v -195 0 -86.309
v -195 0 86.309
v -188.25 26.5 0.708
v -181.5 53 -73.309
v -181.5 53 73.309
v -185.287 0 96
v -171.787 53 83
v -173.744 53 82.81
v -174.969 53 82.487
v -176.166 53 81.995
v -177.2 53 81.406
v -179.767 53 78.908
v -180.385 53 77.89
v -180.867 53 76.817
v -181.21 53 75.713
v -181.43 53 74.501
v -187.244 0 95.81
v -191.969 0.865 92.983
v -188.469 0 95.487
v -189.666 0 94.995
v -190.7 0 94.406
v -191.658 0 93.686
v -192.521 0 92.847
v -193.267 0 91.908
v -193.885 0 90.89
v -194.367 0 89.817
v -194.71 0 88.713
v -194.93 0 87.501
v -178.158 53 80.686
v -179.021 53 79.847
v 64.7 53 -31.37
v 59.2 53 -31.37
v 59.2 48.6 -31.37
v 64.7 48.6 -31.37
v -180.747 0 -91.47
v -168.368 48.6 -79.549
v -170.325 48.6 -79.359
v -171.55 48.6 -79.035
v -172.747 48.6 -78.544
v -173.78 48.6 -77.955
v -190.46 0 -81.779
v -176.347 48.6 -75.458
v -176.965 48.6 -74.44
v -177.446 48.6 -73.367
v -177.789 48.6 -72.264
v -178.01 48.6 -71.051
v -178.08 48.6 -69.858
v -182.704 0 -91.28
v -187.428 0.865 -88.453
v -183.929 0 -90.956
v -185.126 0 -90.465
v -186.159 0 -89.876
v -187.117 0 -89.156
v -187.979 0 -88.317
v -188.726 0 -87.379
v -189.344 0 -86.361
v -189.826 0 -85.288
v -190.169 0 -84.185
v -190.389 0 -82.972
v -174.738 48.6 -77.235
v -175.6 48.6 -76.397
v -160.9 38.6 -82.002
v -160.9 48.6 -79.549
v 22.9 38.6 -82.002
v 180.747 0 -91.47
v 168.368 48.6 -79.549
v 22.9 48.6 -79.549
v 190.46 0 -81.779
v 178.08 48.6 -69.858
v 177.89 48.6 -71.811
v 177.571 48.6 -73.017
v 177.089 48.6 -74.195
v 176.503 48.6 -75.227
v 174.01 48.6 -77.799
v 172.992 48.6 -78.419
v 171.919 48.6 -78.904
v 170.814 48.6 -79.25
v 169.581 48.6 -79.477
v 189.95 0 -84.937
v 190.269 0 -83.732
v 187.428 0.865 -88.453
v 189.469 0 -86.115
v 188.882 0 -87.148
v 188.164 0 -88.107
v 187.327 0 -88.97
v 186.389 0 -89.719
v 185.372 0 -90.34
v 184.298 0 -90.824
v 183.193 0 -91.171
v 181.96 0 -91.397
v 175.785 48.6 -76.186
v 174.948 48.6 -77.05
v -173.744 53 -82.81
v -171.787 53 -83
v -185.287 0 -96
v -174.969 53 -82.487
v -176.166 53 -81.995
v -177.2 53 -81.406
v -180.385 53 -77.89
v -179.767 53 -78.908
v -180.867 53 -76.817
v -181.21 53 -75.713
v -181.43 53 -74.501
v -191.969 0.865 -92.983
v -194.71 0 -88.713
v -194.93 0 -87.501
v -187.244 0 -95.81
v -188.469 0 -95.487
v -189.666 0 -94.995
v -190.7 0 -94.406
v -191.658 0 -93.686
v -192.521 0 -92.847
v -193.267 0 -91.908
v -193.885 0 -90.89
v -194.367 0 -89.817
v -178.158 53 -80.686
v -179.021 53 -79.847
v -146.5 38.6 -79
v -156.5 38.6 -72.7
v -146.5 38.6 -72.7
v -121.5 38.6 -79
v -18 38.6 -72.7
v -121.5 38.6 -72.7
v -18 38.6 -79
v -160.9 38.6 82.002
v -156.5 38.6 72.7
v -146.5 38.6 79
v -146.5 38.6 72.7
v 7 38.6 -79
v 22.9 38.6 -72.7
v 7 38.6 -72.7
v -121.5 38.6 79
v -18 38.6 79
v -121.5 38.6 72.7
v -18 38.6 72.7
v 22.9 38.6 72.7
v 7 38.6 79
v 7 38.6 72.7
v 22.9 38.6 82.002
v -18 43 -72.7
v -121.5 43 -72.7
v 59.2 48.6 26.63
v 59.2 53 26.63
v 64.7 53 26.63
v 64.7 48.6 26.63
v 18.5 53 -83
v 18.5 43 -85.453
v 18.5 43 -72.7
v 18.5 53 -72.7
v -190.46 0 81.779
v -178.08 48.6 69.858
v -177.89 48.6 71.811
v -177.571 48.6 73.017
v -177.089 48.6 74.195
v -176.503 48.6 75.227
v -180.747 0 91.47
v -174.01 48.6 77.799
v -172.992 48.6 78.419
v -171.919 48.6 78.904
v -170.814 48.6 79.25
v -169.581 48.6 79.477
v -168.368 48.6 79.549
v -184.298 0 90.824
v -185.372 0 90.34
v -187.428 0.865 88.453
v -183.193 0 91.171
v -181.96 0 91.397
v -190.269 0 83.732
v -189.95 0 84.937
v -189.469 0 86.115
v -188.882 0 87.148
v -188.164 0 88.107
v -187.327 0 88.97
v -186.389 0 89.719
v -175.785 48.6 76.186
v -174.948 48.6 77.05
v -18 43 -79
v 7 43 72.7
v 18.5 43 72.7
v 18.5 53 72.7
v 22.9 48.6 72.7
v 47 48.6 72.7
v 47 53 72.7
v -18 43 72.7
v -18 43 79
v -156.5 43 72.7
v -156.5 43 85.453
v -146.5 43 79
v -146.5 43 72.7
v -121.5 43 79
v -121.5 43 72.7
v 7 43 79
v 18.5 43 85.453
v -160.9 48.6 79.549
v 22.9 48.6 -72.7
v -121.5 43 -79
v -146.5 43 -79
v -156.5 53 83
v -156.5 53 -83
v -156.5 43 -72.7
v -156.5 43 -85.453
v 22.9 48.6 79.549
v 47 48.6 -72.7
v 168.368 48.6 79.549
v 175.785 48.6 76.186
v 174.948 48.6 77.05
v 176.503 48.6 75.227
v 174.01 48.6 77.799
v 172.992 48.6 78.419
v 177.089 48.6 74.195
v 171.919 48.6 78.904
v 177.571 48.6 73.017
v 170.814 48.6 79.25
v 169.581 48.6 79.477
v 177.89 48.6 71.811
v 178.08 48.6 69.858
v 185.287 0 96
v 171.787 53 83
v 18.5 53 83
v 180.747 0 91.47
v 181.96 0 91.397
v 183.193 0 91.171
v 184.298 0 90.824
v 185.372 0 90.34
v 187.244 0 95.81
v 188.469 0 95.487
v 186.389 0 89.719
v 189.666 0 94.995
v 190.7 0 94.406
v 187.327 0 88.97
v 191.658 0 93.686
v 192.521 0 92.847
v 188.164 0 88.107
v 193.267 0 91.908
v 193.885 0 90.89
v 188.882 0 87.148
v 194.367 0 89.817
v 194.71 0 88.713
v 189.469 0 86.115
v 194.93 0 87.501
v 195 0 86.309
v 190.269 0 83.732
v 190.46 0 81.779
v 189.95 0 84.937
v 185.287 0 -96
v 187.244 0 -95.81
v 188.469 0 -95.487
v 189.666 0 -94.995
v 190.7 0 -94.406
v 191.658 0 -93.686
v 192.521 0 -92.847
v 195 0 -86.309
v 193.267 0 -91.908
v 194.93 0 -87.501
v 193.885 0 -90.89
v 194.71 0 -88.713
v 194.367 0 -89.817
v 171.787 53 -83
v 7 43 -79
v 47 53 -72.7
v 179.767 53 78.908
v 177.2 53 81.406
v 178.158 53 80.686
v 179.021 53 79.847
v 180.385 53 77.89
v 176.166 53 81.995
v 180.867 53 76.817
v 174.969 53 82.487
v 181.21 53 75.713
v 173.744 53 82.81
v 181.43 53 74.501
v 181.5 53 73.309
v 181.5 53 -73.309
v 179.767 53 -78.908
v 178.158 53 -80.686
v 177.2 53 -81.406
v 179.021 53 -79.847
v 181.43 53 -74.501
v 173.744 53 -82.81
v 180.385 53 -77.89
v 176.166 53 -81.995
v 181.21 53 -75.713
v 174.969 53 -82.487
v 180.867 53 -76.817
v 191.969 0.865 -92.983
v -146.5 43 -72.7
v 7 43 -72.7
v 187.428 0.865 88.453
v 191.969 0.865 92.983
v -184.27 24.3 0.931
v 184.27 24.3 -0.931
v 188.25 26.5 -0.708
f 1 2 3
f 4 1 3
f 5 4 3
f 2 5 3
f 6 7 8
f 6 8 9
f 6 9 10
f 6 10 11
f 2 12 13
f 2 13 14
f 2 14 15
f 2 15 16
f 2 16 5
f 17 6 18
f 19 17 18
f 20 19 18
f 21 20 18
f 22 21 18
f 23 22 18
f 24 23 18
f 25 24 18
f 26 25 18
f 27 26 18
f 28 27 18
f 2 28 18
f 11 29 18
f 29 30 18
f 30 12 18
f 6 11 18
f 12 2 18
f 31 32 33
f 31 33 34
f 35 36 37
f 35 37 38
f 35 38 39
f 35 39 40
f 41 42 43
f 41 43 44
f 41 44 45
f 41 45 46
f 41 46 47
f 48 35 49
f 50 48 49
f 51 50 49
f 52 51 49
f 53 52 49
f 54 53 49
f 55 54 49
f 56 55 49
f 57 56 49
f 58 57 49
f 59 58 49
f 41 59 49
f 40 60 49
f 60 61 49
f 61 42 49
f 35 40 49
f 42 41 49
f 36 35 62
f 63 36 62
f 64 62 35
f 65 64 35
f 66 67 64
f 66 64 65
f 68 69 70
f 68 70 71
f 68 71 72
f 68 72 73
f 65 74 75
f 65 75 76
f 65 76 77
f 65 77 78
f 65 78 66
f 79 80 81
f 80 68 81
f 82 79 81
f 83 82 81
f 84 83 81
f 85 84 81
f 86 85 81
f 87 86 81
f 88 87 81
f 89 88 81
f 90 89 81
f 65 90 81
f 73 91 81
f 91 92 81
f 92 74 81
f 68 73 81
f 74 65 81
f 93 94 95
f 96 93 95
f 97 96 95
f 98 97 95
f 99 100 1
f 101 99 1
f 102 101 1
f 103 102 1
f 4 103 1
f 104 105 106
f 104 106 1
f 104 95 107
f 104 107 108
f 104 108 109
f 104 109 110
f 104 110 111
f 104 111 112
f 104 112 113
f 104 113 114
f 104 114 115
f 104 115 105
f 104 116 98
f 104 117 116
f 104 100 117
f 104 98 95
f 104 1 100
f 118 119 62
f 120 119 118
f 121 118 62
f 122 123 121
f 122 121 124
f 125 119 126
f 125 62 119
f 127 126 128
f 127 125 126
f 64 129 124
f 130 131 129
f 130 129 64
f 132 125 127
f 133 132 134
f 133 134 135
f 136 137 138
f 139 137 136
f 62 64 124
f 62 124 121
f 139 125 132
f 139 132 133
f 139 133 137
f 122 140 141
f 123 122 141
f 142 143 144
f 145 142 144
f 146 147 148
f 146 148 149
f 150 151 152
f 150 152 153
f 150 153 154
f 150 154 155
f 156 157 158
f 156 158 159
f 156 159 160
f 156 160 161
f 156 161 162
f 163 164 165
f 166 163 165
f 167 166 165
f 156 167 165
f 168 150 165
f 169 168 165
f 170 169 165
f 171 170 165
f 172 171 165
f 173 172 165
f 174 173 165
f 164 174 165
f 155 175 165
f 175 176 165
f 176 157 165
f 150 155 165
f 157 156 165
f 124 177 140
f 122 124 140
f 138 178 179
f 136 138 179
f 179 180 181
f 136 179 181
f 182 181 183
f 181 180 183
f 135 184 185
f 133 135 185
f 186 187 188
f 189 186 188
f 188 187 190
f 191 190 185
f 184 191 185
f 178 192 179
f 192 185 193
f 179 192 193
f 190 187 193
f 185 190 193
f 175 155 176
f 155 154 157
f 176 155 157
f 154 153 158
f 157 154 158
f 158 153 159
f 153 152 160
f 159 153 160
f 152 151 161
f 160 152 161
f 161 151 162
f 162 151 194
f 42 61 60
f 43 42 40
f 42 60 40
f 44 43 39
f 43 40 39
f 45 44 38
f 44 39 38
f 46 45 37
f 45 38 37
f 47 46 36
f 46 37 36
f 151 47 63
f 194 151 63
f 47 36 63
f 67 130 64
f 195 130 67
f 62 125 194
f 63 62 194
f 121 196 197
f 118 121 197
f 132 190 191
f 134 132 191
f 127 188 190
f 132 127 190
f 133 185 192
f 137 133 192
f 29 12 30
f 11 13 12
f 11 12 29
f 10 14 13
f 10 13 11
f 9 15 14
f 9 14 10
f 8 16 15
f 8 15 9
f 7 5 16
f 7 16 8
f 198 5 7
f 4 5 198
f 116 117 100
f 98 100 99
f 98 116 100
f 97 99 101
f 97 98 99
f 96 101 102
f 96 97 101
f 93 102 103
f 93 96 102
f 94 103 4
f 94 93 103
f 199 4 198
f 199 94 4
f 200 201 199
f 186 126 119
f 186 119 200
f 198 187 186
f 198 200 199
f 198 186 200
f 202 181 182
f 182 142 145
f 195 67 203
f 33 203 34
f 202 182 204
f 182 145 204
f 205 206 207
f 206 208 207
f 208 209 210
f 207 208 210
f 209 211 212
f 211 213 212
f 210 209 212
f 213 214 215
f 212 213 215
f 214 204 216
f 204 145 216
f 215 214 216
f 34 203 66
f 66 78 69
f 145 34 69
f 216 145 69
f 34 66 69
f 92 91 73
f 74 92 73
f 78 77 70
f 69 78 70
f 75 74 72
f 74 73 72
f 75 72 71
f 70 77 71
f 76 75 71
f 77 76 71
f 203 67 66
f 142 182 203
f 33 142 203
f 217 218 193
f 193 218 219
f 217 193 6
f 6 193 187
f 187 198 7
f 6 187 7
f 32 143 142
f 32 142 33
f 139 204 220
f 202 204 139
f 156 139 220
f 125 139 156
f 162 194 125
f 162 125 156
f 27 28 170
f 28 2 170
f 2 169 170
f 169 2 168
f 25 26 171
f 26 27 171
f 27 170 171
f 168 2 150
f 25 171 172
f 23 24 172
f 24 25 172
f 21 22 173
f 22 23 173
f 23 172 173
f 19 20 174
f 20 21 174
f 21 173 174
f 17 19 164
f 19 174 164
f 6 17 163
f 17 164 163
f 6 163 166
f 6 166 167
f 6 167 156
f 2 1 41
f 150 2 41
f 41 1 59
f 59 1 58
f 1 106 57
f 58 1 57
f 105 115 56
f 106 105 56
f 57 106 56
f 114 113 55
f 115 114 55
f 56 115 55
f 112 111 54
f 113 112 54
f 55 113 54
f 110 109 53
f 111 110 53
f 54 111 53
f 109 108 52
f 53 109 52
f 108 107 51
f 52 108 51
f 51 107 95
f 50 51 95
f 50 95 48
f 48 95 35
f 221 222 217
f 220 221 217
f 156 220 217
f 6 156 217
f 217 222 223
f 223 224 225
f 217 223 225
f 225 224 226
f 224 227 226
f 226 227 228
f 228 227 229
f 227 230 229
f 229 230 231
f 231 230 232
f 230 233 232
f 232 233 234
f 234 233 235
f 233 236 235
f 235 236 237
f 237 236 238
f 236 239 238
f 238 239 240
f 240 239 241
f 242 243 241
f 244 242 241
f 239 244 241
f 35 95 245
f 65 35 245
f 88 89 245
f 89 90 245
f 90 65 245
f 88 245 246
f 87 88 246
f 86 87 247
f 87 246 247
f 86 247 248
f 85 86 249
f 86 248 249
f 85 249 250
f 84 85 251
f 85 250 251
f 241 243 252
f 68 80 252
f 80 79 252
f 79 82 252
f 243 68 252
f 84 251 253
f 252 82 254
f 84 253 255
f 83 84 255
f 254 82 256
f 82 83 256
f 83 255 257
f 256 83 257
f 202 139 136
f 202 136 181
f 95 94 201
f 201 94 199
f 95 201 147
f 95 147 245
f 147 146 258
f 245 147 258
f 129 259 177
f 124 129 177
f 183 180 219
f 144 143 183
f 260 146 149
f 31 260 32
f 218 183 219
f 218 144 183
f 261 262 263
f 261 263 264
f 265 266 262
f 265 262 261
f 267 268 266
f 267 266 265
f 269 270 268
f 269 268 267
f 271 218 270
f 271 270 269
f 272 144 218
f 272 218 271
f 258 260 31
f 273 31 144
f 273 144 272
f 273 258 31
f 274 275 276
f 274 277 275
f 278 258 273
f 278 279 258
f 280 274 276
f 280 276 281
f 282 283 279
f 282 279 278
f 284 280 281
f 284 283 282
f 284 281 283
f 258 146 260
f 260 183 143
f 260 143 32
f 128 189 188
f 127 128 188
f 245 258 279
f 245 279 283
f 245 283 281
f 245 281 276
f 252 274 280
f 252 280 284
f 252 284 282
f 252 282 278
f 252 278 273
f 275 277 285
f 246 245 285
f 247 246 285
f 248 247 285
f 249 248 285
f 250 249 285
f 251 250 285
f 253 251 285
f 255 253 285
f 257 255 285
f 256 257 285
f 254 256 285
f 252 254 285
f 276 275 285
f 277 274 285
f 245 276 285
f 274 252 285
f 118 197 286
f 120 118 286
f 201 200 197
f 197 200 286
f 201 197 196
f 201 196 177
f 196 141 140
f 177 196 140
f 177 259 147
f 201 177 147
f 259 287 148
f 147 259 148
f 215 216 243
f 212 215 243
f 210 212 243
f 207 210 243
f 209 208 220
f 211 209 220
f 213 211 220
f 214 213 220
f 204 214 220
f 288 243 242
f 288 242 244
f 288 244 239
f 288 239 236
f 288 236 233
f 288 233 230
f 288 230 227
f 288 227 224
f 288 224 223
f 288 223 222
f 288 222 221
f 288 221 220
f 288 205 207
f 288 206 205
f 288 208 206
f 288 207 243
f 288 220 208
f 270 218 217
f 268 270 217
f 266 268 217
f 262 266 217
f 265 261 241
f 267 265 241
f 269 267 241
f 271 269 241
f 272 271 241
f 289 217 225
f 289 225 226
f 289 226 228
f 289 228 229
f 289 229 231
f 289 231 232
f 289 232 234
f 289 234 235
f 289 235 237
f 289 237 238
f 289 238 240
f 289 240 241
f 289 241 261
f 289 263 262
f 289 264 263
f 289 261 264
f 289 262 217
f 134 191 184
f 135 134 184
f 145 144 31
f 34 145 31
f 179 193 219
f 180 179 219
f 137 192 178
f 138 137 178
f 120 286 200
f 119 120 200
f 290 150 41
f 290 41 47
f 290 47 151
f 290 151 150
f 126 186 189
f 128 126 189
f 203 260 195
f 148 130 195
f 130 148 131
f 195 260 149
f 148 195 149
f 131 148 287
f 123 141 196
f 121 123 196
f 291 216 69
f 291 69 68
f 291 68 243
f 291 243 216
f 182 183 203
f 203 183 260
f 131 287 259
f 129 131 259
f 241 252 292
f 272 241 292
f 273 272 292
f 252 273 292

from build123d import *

# Parameters (mm, degrees)
CUT_EXTRUDE1_REACH             = 265.708
SKETCH4_W                      = 175
SKETCH4_H                      = 10
CUT_EXTRUDE1_DIRECTION_2_REACH = 265.708
SHELL1_T                       = -4.4
CUT_EXTRUDE2_DEPTH             = 224.718573366
FILLET1_R                      = 10
SKETCH7_W                      = 5.5
SKETCH7_H                      = 58
CUT_EXTRUDE4_DEPTH             = 10


with BuildPart() as part:
    # Sketch2 → Loft1 section 0
    with BuildSketch(Plane(origin=(0, 0, 0), x_dir=(1, 0, 0), z_dir=(0, 1, 0))):
        with BuildLine():
            Line((-195, 96), (195, 96))
            Line((195, 96), (195, -96))
            Line((195, -96), (-195, -96))
            Line((-195, -96), (-195, 96))
        make_face()
    # Sketch3 → Loft1 section 1
    with BuildSketch(Plane(origin=(0, 53, 0), x_dir=(1, 0, 0), z_dir=(0, 1, 0))):
        with BuildLine():
            Line((-181.5, 83), (181.5, 83))
            Line((181.5, 83), (181.5, -83))
            Line((181.5, -83), (-181.5, -83))
            Line((-181.5, -83), (-181.5, 83))
        make_face()
    loft()

    # Cut-Extrude1: up to this plane
    cut_extrude1_end = Plane(origin=(0, 22.210879785, -90.552048355), z_dir=(0, -0.23822152779764819, 0.9712108440981054))
    # Sketch4 → Cut-Extrude1 (cut, up to the surface)
    with BuildSketch(Plane.XY, mode=Mode.PRIVATE) as cut_extrude1_sk1:
        with Locations((-69, 48)):
            Rectangle(SKETCH4_W, SKETCH4_H)
    cut_extrude1_tool1 = split(extrude(cut_extrude1_sk1.sketch, amount=-CUT_EXTRUDE1_REACH, mode=Mode.PRIVATE), bisect_by=cut_extrude1_end, keep=Keep.BOTH, mode=Mode.PRIVATE)
    add(cut_extrude1_tool1.solids().sort_by_distance((-69, 48, 0))[0], mode=Mode.SUBTRACT)

    # Cut-Extrude1 direction 2: up to this plane
    cut_extrude1_direction_2_end = Plane(origin=(0, 22.210879785, 90.552048355), z_dir=(0, -0.23822152779764863, -0.9712108440981052))
    # Sketch4 → Cut-Extrude1 direction 2 (cut, up to the surface)
    with BuildSketch(Plane.XY, mode=Mode.PRIVATE) as cut_extrude1_direction_2_sk1:
        with Locations((-69, 48)):
            Rectangle(SKETCH4_W, SKETCH4_H)
    cut_extrude1_direction_2_tool1 = split(extrude(cut_extrude1_direction_2_sk1.sketch, amount=CUT_EXTRUDE1_DIRECTION_2_REACH, mode=Mode.PRIVATE), bisect_by=cut_extrude1_direction_2_end, keep=Keep.BOTH, mode=Mode.PRIVATE)
    add(cut_extrude1_direction_2_tool1.solids().sort_by_distance((-69, 48, 0))[0], mode=Mode.SUBTRACT)

    # Shell1
    shell1_openings = [part.faces().sort_by_distance(p)[0] for p in [
        (0, 0, 0),
    ]]
    offset(amount=SHELL1_T, openings=shell1_openings, kind=Kind.INTERSECTION)

    # Sketch5 → Cut-Extrude2 (cut, through all)
    with BuildSketch(Plane(origin=(0, 53, 0), x_dir=(1, 0, 0), z_dir=(0, 1, 0))):
        Polygon((47, -72.7), (47, 72.7), (7, 72.7), (7, 79), (-18, 79), (-18, 72.7), (-121.5, 72.7), (-121.5, 79), (-146.5, 79), (-146.5, 72.7), (-156.5, 72.7), (-156.5, -72.7), (-146.5, -72.7), (-146.5, -79), (-121.5, -79), (-121.5, -72.7), (-18, -72.7), (-18, -79), (7, -79), (7, -72.7), align=None)
    extrude(amount=-CUT_EXTRUDE2_DEPTH, mode=Mode.SUBTRACT)

    # Fillet1
    fillet1_edges = [part.edges().sort_by_distance(p)[0] for p in [
        (-188.25, 26.5, 89.5),
        (-188.25, 26.5, -89.5),
        (188.25, 26.5, 89.5),
        (188.25, 26.5, -89.5),
        (-184.269882767, 24.3, -85.509195467),
        (-184.269882767, 24.3, 85.509195467),
        (184.269882767, 24.3, 85.509195467),
        (184.269882767, 24.3, -85.509195467),
    ]]
    fillet(fillet1_edges, radius=FILLET1_R)

    # Sketch7 → Cut-Extrude4 (cut)
    with BuildSketch(Plane(origin=(0, 53, 0), x_dir=(1, 0, 0), z_dir=(0, 1, 0))):
        with Locations((61.95, 2.369883227)):
            Rectangle(SKETCH7_W, SKETCH7_H)
    extrude(amount=-CUT_EXTRUDE4_DEPTH, mode=Mode.SUBTRACT)


solid = part.part
